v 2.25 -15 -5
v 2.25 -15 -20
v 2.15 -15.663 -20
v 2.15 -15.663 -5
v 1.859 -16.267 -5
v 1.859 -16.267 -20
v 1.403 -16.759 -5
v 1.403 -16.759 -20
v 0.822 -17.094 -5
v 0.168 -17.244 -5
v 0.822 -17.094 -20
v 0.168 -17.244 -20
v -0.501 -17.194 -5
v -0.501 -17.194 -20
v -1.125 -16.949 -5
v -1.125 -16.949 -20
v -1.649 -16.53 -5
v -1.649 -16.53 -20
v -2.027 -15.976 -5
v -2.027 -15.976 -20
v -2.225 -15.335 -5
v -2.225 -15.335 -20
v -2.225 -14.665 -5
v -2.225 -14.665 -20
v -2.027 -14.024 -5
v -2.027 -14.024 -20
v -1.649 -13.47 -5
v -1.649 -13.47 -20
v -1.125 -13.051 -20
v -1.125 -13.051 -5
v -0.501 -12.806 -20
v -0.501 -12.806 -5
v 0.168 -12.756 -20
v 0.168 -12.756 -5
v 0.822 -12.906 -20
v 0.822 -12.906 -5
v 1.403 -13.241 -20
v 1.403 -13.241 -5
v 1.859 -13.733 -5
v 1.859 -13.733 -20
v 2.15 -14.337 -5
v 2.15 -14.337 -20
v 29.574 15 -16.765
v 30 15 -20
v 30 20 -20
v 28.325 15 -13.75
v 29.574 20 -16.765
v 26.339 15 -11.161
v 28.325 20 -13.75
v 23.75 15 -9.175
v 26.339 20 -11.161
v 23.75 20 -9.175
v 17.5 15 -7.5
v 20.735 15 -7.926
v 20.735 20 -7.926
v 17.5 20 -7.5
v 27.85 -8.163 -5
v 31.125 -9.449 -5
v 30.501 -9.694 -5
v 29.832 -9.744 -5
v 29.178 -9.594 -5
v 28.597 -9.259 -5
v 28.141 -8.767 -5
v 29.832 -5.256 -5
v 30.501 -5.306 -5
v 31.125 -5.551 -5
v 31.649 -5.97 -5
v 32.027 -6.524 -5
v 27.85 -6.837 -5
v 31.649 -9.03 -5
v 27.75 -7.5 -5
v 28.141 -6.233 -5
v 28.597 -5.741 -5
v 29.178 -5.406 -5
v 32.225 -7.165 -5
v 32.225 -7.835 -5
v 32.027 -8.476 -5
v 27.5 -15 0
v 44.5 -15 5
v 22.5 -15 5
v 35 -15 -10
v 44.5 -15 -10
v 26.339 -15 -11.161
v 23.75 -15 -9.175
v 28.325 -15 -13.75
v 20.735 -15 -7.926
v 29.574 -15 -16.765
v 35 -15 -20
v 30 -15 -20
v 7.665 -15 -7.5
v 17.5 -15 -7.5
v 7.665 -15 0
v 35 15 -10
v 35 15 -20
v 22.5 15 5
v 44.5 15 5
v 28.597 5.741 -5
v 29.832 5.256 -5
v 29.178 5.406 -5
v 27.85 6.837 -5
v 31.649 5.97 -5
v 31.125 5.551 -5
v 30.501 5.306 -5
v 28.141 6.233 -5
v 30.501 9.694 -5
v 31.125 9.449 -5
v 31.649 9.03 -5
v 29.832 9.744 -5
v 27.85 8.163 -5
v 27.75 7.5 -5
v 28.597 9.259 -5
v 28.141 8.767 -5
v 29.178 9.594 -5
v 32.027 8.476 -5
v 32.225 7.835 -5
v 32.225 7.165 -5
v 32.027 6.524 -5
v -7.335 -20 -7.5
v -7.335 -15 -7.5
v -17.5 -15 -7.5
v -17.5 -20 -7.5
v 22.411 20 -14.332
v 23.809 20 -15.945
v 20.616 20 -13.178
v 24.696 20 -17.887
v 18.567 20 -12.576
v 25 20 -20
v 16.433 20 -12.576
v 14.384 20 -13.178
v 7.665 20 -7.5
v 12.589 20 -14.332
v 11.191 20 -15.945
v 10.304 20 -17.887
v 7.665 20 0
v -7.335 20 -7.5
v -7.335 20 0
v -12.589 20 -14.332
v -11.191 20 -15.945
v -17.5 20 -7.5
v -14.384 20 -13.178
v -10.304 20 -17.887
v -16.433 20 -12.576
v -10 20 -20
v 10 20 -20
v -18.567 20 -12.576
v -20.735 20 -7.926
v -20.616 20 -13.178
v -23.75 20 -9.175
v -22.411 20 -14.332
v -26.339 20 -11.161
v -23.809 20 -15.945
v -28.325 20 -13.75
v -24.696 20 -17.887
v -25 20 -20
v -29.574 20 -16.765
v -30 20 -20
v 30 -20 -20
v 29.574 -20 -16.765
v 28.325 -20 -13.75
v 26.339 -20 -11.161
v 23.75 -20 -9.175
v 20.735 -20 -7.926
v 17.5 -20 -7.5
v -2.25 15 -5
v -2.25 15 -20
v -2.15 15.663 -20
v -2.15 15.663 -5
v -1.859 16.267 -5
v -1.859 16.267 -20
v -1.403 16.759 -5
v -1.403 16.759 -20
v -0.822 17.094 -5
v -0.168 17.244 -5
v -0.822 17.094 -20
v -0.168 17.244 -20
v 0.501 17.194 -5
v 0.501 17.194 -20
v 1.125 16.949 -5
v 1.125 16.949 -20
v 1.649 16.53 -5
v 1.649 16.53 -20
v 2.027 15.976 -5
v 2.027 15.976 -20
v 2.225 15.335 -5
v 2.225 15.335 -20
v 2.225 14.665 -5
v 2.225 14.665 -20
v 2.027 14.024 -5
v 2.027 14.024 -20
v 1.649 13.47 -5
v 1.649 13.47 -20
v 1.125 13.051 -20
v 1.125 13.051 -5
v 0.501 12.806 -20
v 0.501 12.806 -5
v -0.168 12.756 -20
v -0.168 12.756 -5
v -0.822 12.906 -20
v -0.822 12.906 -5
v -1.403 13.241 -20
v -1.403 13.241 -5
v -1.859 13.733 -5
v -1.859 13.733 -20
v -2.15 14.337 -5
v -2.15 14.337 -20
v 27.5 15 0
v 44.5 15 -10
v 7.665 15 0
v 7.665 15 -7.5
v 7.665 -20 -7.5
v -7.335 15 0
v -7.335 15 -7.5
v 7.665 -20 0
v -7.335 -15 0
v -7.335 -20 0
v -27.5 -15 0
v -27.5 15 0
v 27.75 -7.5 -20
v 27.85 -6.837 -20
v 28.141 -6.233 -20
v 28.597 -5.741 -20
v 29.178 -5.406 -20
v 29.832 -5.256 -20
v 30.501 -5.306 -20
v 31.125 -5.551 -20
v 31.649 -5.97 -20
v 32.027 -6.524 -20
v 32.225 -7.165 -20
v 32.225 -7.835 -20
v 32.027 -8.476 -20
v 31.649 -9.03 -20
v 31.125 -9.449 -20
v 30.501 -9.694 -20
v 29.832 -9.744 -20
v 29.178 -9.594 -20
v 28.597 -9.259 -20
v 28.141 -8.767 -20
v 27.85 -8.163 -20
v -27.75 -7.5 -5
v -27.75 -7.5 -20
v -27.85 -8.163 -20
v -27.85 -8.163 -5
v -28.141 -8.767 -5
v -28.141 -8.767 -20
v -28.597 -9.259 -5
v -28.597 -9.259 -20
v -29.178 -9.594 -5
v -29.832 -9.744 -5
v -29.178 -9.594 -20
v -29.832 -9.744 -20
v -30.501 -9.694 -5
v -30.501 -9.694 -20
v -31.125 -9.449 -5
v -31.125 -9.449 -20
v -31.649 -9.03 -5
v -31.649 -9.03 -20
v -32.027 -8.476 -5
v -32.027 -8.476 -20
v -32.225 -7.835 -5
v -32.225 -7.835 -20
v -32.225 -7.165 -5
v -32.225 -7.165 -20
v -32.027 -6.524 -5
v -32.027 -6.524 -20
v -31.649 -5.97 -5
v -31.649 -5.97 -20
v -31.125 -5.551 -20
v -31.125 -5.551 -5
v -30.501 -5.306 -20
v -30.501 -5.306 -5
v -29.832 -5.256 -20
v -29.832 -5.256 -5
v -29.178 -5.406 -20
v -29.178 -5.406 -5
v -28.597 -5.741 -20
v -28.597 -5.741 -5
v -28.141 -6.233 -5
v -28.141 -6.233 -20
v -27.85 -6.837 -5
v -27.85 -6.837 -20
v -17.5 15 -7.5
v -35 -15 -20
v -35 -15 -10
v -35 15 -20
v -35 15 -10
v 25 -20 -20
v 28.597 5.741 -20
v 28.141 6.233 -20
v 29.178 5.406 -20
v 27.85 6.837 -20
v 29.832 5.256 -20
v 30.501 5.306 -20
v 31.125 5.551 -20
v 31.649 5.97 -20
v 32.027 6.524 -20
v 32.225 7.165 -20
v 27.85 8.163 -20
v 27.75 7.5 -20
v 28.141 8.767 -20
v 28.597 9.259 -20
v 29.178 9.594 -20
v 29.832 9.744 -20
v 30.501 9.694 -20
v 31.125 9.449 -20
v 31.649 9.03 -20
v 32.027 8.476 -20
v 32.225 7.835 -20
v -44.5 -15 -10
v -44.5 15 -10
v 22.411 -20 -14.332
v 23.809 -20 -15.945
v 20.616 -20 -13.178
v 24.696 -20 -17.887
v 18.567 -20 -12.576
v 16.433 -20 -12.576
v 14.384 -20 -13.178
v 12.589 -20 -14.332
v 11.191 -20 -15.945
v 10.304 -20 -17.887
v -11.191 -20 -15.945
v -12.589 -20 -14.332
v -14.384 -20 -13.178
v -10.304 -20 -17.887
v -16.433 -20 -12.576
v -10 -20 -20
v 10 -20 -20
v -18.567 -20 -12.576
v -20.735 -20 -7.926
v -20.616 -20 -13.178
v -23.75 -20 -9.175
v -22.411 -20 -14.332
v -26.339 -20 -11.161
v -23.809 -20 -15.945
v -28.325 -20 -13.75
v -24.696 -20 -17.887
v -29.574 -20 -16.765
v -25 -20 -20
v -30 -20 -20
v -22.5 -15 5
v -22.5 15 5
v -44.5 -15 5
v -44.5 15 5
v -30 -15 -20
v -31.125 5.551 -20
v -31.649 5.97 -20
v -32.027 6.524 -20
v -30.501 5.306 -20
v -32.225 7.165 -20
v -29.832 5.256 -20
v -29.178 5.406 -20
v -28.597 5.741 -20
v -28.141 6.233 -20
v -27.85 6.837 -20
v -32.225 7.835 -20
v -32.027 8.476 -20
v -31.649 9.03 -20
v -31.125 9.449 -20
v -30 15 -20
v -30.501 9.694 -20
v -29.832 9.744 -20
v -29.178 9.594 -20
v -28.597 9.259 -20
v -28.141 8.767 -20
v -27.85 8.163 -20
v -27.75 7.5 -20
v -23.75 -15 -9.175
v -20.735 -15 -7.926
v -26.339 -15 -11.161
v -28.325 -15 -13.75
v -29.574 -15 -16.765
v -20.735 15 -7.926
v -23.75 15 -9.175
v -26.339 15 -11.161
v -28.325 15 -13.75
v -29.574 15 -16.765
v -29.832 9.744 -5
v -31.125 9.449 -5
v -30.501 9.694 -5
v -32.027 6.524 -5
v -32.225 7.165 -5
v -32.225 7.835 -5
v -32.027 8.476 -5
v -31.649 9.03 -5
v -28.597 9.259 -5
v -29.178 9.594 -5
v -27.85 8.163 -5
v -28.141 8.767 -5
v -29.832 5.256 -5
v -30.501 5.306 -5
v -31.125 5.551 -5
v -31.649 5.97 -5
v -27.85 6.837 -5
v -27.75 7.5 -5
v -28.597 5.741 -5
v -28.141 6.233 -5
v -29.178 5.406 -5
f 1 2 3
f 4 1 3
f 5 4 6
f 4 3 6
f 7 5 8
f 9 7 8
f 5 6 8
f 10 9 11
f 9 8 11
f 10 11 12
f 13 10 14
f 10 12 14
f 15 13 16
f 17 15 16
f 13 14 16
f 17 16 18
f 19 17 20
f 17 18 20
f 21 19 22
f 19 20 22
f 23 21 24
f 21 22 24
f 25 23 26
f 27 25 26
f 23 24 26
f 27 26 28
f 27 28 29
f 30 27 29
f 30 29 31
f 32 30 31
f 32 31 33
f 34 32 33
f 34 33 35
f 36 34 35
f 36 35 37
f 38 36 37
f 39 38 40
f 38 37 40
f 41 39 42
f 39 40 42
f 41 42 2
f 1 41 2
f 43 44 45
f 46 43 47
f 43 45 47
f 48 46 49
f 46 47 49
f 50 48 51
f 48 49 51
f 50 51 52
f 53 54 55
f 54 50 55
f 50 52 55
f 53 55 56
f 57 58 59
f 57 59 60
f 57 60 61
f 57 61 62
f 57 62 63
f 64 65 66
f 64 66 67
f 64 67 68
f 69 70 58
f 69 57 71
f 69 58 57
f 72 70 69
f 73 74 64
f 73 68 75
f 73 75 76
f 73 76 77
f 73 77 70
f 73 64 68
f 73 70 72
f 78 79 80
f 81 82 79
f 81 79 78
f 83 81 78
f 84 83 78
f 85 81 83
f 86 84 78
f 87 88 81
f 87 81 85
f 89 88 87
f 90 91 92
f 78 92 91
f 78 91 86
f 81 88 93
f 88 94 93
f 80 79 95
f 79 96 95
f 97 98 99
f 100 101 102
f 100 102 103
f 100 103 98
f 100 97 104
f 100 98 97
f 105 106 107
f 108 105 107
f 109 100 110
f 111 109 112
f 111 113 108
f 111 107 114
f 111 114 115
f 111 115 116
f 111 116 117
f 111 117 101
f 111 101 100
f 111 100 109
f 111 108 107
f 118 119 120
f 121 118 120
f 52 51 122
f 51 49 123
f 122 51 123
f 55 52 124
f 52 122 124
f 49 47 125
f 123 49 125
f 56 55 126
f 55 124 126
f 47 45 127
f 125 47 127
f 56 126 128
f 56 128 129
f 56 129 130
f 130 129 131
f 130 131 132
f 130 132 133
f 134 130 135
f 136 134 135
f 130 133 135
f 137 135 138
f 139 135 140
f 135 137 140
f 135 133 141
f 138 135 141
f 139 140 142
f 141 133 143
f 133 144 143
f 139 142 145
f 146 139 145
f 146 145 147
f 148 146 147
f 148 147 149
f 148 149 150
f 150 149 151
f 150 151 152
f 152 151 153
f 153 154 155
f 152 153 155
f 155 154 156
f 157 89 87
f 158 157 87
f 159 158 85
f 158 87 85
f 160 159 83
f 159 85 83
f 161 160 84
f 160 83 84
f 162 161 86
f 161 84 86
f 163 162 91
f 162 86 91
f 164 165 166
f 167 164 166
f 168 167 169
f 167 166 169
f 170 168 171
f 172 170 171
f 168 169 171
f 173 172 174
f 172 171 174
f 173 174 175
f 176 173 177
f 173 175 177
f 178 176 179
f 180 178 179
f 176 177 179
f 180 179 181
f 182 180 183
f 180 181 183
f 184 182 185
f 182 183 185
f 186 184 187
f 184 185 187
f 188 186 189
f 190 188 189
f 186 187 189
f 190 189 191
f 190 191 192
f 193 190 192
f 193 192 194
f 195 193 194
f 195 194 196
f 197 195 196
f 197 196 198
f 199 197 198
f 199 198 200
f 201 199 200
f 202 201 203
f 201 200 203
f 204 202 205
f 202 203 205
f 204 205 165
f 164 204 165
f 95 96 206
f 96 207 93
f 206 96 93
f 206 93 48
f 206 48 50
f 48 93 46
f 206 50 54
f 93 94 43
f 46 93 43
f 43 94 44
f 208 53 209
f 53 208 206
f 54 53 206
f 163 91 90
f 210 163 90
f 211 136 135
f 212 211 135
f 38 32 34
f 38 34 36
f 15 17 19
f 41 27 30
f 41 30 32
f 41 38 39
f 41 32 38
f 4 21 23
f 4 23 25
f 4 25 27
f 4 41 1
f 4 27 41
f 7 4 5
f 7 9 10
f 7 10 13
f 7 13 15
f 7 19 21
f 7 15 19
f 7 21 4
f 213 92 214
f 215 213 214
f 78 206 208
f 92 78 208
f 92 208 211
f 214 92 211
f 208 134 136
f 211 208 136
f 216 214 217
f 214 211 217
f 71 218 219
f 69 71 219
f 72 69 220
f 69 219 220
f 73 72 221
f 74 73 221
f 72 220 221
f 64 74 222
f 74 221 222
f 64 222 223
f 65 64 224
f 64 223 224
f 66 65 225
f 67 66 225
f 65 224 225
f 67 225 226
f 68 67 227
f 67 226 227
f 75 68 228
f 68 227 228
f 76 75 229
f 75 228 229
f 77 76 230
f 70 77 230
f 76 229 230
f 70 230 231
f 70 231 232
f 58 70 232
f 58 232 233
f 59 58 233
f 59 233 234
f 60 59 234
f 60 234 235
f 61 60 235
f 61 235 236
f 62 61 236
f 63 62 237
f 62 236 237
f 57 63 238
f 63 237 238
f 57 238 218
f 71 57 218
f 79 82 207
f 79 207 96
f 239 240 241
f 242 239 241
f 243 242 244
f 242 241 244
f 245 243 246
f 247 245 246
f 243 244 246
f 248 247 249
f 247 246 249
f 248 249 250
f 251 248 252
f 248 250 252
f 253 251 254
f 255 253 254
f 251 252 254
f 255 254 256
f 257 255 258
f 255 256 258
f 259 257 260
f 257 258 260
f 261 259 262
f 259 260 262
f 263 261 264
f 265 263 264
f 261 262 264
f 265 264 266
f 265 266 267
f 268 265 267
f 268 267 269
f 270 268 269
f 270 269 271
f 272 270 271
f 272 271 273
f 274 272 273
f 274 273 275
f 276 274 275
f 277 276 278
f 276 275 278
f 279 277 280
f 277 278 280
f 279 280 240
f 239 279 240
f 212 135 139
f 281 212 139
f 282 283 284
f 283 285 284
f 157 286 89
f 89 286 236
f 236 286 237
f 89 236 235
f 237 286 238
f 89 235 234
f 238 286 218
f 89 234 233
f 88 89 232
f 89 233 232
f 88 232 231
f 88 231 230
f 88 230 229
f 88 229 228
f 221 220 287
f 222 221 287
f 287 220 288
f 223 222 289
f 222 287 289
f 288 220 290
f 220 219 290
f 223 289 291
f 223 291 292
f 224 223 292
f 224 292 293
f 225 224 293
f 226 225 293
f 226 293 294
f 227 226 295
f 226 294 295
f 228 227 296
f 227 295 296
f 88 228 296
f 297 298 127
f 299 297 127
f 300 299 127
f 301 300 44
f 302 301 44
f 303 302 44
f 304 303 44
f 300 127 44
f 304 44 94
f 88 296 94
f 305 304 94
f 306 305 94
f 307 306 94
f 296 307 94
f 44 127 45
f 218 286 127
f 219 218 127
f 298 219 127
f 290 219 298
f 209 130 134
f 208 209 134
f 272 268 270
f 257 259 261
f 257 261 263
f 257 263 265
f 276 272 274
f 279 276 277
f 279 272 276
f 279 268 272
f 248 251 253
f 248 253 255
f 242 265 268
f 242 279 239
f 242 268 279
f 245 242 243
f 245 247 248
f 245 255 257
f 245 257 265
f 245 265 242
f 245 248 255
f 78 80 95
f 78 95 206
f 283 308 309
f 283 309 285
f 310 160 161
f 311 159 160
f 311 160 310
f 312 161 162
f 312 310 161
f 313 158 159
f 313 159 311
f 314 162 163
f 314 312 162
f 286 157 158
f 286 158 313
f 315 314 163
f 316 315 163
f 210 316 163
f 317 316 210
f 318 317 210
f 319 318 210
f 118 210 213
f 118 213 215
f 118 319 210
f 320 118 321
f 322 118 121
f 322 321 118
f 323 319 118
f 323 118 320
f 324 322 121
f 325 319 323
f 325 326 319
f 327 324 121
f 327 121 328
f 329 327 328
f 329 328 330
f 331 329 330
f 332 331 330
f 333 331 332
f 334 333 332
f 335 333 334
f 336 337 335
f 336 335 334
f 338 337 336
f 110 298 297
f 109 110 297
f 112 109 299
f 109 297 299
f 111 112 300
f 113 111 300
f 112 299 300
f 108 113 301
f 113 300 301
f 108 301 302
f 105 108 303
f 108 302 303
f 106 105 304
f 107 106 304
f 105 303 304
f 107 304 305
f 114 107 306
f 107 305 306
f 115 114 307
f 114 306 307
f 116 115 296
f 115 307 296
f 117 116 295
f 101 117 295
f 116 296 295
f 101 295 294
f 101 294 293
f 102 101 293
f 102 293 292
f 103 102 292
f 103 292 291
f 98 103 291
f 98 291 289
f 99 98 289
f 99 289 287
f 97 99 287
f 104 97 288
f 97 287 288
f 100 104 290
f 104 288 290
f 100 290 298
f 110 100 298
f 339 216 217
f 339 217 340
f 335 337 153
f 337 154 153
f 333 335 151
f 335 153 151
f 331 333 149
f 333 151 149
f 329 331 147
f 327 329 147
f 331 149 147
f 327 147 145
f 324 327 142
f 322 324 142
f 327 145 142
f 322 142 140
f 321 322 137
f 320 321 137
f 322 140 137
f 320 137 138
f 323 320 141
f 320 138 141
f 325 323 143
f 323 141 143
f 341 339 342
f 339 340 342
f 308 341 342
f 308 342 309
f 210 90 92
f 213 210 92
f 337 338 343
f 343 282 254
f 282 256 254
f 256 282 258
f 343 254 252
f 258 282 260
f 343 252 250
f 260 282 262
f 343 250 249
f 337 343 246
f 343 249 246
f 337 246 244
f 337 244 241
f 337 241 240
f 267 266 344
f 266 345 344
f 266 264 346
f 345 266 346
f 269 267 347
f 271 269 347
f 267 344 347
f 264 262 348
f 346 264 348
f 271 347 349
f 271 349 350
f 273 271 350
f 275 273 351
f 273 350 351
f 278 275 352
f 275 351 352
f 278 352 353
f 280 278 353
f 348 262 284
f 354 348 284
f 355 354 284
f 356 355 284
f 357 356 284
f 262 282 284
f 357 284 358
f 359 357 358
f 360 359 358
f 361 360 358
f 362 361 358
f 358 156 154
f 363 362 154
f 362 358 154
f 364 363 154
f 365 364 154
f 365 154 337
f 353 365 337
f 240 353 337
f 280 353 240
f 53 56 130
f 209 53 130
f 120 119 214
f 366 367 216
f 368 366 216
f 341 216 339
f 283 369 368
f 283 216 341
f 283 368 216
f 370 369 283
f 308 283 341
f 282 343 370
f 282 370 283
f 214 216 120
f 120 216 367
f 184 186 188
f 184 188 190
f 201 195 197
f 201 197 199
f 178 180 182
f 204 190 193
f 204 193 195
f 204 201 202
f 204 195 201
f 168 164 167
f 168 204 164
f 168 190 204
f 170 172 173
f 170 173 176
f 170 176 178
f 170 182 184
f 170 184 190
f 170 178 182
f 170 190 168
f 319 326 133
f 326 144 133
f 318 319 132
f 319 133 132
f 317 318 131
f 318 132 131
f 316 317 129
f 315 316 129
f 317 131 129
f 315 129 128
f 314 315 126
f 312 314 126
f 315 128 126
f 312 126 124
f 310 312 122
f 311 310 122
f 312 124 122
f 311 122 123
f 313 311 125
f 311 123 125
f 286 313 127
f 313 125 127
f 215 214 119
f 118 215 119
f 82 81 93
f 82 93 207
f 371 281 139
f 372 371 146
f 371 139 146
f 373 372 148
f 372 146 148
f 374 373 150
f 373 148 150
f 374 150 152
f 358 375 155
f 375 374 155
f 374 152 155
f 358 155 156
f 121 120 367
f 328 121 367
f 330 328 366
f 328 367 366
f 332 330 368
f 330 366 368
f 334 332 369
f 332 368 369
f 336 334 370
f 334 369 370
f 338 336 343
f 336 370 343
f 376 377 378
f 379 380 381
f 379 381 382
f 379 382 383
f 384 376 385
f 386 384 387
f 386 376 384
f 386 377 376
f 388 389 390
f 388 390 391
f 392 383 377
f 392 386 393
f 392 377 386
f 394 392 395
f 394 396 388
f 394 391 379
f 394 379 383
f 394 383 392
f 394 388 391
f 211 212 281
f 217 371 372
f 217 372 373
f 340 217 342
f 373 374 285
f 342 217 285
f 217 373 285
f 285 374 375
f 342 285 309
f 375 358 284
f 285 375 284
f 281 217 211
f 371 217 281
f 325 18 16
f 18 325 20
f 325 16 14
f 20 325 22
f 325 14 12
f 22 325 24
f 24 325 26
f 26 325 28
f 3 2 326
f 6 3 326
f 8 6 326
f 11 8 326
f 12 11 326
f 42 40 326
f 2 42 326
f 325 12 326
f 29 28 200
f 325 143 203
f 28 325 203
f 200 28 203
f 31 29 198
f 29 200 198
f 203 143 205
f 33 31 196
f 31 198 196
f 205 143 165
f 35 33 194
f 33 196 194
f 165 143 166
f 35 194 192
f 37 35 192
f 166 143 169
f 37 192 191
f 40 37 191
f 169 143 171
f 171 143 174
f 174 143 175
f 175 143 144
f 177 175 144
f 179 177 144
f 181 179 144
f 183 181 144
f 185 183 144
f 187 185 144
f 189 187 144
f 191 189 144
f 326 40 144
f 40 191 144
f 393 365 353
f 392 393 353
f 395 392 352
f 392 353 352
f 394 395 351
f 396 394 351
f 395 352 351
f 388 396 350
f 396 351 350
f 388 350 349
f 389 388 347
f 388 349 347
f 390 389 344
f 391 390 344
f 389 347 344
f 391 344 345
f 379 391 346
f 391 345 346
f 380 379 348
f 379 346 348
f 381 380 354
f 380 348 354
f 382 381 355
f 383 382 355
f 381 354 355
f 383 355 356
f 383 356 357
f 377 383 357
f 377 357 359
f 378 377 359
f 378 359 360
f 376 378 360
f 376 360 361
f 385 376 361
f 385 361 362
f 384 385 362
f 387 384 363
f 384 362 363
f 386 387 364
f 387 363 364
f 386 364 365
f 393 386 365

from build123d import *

# Parameters (mm, degrees)
BOSS_EXTRUDE1_DEPTH = 15
BOSS_EXTRUDE2_DEPTH = 20
SKETCH3_R           = 2.25
CUT_EXTRUDE1_DEPTH  = 15


with BuildPart() as part:
    # Sketch1 → Boss-Extrude1 (new, symmetric)
    with BuildSketch(Plane(origin=(0, 0, 0), x_dir=(1, 0, 0), z_dir=(0, 1, 0))):
        with BuildLine():
            Line((0, 0), (-27.5, 0))
            Line((-27.5, 0), (-22.5, -5))
            Line((-22.5, -5), (-44.5, -5))
            Line((-44.5, -5), (-44.5, 10))
            Line((-44.5, 10), (-35, 10))
            Line((-35, 10), (-35, 20))
            Line((-35, 20), (-25, 20))
            ThreePointArc((-25, 20), (-17.5, 12.5), (-10, 20))
            Line((-10, 20), (10, 20))
            ThreePointArc((10, 20), (17.5, 12.5), (25, 20))
            Line((25, 20), (35, 20))
            Line((35, 20), (35, 10))
            Line((35, 10), (44.5, 10))
            Line((44.5, 10), (44.5, -5))
            Line((44.5, -5), (22.5, -5))
            Line((22.5, -5), (27.5, 0))
            Line((27.5, 0), (0, 0))
        make_face()
    extrude(amount=BOSS_EXTRUDE1_DEPTH, both=True)

    # Sketch2 → Boss-Extrude2 (add, symmetric)
    with BuildSketch(Plane(origin=(0, 0, 0), x_dir=(1, 0, 0), z_dir=(0, 1, 0))):
        with BuildLine():
            Line((-30, 20), (-25, 20))
            ThreePointArc((-25, 20), (-17.5, 12.5), (-10, 20))
            Line((-10, 20), (5, 20))
            Line((5, 20), (10, 20))
            ThreePointArc((10, 20), (17.5, 12.5), (25, 20))
            Line((25, 20), (30, 20))
            ThreePointArc((30, 20), (26.338834765, 11.161165235), (17.5, 7.5))
            Line((17.5, 7.5), (7.664635512, 7.5))
            Line((7.664635512, 7.5), (7.664635512, 0))
            Line((7.664635512, 0), (-7.335364488, 0))
            Line((-7.335364488, 0), (-7.335364488, 7.5))
            Line((-7.335364488, 7.5), (-17.5, 7.5))
            ThreePointArc((-17.5, 7.5), (-26.338834765, 11.161165235), (-30, 20))
        make_face()
    extrude(amount=BOSS_EXTRUDE2_DEPTH, both=True)

    # Sketch3 → Cut-Extrude1 (cut)
    with BuildSketch(Plane(origin=(0, 0, -20), x_dir=(-1, 0, 0), z_dir=(0, 0, -1))):
        with Locations((0, 15)):
            Circle(SKETCH3_R)
        with Locations((-30, 7.5)):
            Circle(SKETCH3_R)
        with Locations((-30, -7.5)):
            Circle(SKETCH3_R)
        with Locations(Location((30, -7.5, 0), (0, 0, 180))):
            Circle(SKETCH3_R)
        with Locations(Location((30, 7.5, 0), (0, 0, 180))):
            Circle(SKETCH3_R)
        with Locations(Location((0, -15, 0), (0, 0, 180))):
            Circle(SKETCH3_R)
    extrude(amount=-CUT_EXTRUDE1_DEPTH, mode=Mode.SUBTRACT)


solid = part.part
